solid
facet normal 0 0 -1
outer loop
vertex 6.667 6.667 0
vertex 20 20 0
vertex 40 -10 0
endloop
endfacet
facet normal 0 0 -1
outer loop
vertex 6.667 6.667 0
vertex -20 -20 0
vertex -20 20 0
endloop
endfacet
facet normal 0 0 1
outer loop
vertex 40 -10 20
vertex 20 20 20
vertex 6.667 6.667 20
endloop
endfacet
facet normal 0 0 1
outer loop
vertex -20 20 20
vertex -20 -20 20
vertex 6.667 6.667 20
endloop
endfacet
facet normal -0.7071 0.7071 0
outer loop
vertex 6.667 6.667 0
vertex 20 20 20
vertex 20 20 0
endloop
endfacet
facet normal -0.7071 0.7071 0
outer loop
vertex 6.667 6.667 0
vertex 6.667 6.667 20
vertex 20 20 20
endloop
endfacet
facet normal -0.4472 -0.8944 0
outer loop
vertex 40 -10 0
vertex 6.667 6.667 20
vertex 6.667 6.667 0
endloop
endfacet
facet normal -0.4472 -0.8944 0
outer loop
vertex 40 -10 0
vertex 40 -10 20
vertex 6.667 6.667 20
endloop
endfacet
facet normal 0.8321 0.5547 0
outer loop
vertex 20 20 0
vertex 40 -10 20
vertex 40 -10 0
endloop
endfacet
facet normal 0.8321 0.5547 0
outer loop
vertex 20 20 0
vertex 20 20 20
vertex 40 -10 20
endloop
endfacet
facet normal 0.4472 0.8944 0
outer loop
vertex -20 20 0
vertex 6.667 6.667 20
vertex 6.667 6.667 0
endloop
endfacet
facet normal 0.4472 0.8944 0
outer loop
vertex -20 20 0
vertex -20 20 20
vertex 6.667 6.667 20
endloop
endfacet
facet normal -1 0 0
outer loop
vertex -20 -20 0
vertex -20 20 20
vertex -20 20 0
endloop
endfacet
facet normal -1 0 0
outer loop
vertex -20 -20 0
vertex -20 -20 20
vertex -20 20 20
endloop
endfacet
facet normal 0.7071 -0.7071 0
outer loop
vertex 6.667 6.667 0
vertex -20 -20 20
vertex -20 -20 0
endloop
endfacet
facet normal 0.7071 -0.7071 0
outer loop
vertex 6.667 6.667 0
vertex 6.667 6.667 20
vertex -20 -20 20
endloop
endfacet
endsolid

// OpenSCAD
scale(20)
linear_extrude(height = 1) {
    polygon(
        points=[
            [-1,-1],
            [+1,+1],
            [+2,-0.5],
            [-1,+1]
        ]
    );
    // translate([3,3]) square(0.1);
}
